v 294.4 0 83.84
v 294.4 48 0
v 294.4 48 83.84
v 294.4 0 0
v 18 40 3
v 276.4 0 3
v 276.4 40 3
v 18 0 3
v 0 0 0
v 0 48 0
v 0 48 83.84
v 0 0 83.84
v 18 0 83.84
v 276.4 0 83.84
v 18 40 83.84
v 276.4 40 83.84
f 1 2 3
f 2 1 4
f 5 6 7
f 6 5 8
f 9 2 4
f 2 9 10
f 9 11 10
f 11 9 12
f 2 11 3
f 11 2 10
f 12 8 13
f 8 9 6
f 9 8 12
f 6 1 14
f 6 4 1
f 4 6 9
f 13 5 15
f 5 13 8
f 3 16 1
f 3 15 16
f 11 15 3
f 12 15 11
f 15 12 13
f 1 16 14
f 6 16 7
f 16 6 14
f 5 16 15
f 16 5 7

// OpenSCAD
// file: ../magnet_well.scad
// magnet_well.scad
// version: 0.2.0
// Shared disc-magnet press-fit recipes and well cutters. Product parts pass a
// named recipe so identical magnet specifications cannot drift by caller.

$fn = 64;
EPS = 0.01;

MAGNET_RECIPE_BORE_DIAMETER = 0;
MAGNET_RECIPE_RIB_TIP_DIAMETER = 1;
MAGNET_RECIPE_RIB_PROTRUSION = 2;
MAGNET_RECIPE_WELL_DEPTH = 3;
MAGNET_RECIPE_CHAMFER = 4;
MAGNET_RECIPE_RIB_COUNT = 5;
MAGNET_RECIPE_RIB_WIDTH = 6;
MAGNET_RECIPE_FIELD_COUNT = 7;

// Canonical product recipe for a 6 x 1.5mm disc magnet. The proven 0.25mm
// radial crush defines the 5.60mm rib-tip diameter from the 6.10mm bore.
// The selected 2.30mm depth remains pending physical confirmation.
function hutchfinity_magnet_recipe_6x1_5() =
    let(
        bore_diameter = 6.10,
        rib_protrusion = 0.25
    ) [
        bore_diameter,
        bore_diameter - 2 * rib_protrusion,
        rib_protrusion,
        2.30,
        0.30,
        8,
        0.80
    ];

function hutchfinity_magnet_recipe_bore_diameter(recipe) =
    recipe[MAGNET_RECIPE_BORE_DIAMETER];
function hutchfinity_magnet_recipe_rib_tip_diameter(recipe) =
    recipe[MAGNET_RECIPE_RIB_TIP_DIAMETER];
function hutchfinity_magnet_recipe_rib_protrusion(recipe) =
    recipe[MAGNET_RECIPE_RIB_PROTRUSION];
function hutchfinity_magnet_recipe_well_depth(recipe) =
    recipe[MAGNET_RECIPE_WELL_DEPTH];
function hutchfinity_magnet_recipe_chamfer(recipe) =
    recipe[MAGNET_RECIPE_CHAMFER];
function hutchfinity_magnet_recipe_rib_count(recipe) =
    recipe[MAGNET_RECIPE_RIB_COUNT];
function hutchfinity_magnet_recipe_rib_width(recipe) =
    recipe[MAGNET_RECIPE_RIB_WIDTH];

function hutchfinity_magnet_recipe_is_valid(recipe) =
    is_list(recipe) &&
    len(recipe) == MAGNET_RECIPE_FIELD_COUNT &&
    hutchfinity_magnet_recipe_bore_diameter(recipe) > 0 &&
    hutchfinity_magnet_recipe_rib_tip_diameter(recipe) > 0 &&
    hutchfinity_magnet_recipe_rib_protrusion(recipe) >= 0 &&
    abs(
        hutchfinity_magnet_recipe_bore_diameter(recipe) -
        hutchfinity_magnet_recipe_rib_tip_diameter(recipe) -
        2 * hutchfinity_magnet_recipe_rib_protrusion(recipe)
    ) <= EPS &&
    hutchfinity_magnet_recipe_well_depth(recipe) > 0 &&
    hutchfinity_magnet_recipe_chamfer(recipe) >= 0 &&
    hutchfinity_magnet_recipe_rib_count(recipe) >= 3 &&
    hutchfinity_magnet_recipe_rib_width(recipe) > 0;

module hutchfinity_magnet_well_cut(
    position,
    recipe = hutchfinity_magnet_recipe_6x1_5(),
    z = 0
) {
    bore_diameter = hutchfinity_magnet_recipe_bore_diameter(recipe);
    rib_tip_diameter = hutchfinity_magnet_recipe_rib_tip_diameter(recipe);
    rib_protrusion = hutchfinity_magnet_recipe_rib_protrusion(recipe);
    well_depth = hutchfinity_magnet_recipe_well_depth(recipe);
    well_chamfer = hutchfinity_magnet_recipe_chamfer(recipe);
    rib_count = hutchfinity_magnet_recipe_rib_count(recipe);
    rib_width = hutchfinity_magnet_recipe_rib_width(recipe);
    bore_r = bore_diameter / 2;
    tip_r = rib_tip_diameter / 2;
    chamfer = min(well_chamfer, well_depth / 2);
    rib_depth = max(EPS, well_depth - chamfer);

    assert(hutchfinity_magnet_recipe_is_valid(recipe),
        "magnet recipe must contain one consistent bore, rib, depth, chamfer, count, and width");

    translate([position[0], position[1], z - EPS])
    union() {
        cylinder(r1=bore_r + chamfer, r2=bore_r, h=chamfer + EPS);

        translate([0, 0, chamfer])
        difference() {
            cylinder(r=bore_r, h=rib_depth + 2 * EPS);

            if (rib_protrusion > EPS) {
                for (i = [0 : rib_count - 1]) {
                    rotate([0, 0, i * (360 / rib_count)])
                    linear_extrude(height=rib_depth + 3 * EPS)
                    polygon([
                        [tip_r, 0],
                        [bore_r, -rib_width / 2],
                        [bore_r, rib_width / 2]
                    ]);
                }
            }
        }
    }
}

module hutchfinity_magnet_well_cuts(
    positions,
    recipe = hutchfinity_magnet_recipe_6x1_5(),
    z = 0
) {
    for (p = positions)
        hutchfinity_magnet_well_cut(p, recipe, z);
}
// file: ../knob.scad
// Hutchfinity optional glue-on knob prototype.
// Version: 0.2.1

$fn = 64;
EPS = 0.01;

BASE_WIDTH = 90.0;
BASE_DEPTH = 34.0;
BASE_THICKNESS = 1.2;
BASE_CORNER_RADIUS = 5.0;

FLARE_WIDTH = 62.0;
FLARE_DEPTH = 28.0;
FLARE_HEIGHT = 3.0;

NECK_WIDTH = 36.0;
NECK_DEPTH = 18.0;
END_BULGE_WIDTH = 56.0;
END_BULGE_DEPTH = 30.0;
GRIP_HEIGHT = 14.0;
GRIP_CORNER_RADIUS = 6.0;

module rounded_box(size, radius) {
    width = size[0];
    depth = size[1];
    height = size[2];
    linear_extrude(height = height)
        offset(r = radius)
            square([max(width - 2 * radius, EPS), max(depth - 2 * radius, EPS)], center = true);
}

module tapered_slug(bottom_size, top_size, height, radius) {
    hull() {
        translate([0, 0, 0])
            rounded_box([bottom_size[0], bottom_size[1], EPS], min(radius, bottom_size[0] / 2 - EPS, bottom_size[1] / 2 - EPS));
        translate([0, 0, height - EPS])
            rounded_box([top_size[0], top_size[1], EPS], min(radius, top_size[0] / 2 - EPS, top_size[1] / 2 - EPS));
    }
}

module hutchfinity_knob(
    base_width = BASE_WIDTH,
    base_depth = BASE_DEPTH,
    base_thickness = BASE_THICKNESS,
    base_corner_radius = BASE_CORNER_RADIUS,
    flare_width = FLARE_WIDTH,
    flare_depth = FLARE_DEPTH,
    flare_height = FLARE_HEIGHT,
    neck_width = NECK_WIDTH,
    neck_depth = NECK_DEPTH,
    end_bulge_width = END_BULGE_WIDTH,
    end_bulge_depth = END_BULGE_DEPTH,
    grip_height = GRIP_HEIGHT,
    grip_corner_radius = GRIP_CORNER_RADIUS
) {
    assert(base_width > end_bulge_width, "base_width must exceed end_bulge_width for a glue flange");
    assert(base_depth > end_bulge_depth, "base_depth must exceed end_bulge_depth for a glue flange");
    assert(end_bulge_width > neck_width, "end_bulge_width should exceed neck_width");
    assert(end_bulge_depth > neck_depth, "end_bulge_depth should exceed neck_depth");

    union() {
        rounded_box([base_width, base_depth, base_thickness], base_corner_radius);

        translate([0, 0, base_thickness - EPS])
            tapered_slug(
                [flare_width, flare_depth],
                [neck_width, neck_depth],
                flare_height + EPS,
                min(grip_corner_radius, flare_depth / 2 - EPS)
            );

        translate([0, 0, base_thickness + flare_height - EPS])
            tapered_slug(
                [neck_width, neck_depth],
                [end_bulge_width, end_bulge_depth],
                grip_height + EPS,
                grip_corner_radius
            );
    }
}

hutchfinity_knob();
// file: ../peg.scad
// peg.scad
// version: 0.5.0
// Prototype laid-down hex peg for vertical Hutchfinity casing stacks.

$fn = 64;
EPS = 0.01;

// Diameter is point-to-point across the hex. The default matches the current
// casing socket default: 8.0mm nominal peg + 0.45mm socket clearance.
PEG_DIAMETER = 8.45;
// Two nominal 10 mm receivers leave 0.4 mm total axial allowance.
PEG_LENGTH = 19.6;
PEG_END_CHAMFER = 2.5;
PEG_CORE_SIDES = 6;
PEG_PRINT_FACE_ROTATION = 30;

function peg_tip_diameter(diameter, chamfer) = max(0.8, diameter - 2 * chamfer);
function peg_flat_to_flat_diameter(diameter, core_sides) =
    diameter * cos(180 / core_sides);

module chamfered_peg_core(diameter, length, chamfer, core_sides) {
    tip_d = peg_tip_diameter(diameter, chamfer);

    union() {
        cylinder(d1=tip_d, d2=diameter, h=chamfer, $fn=core_sides);
        translate([0, 0, chamfer])
            cylinder(d=diameter, h=max(EPS, length - 2 * chamfer), $fn=core_sides);
        translate([0, 0, length - chamfer])
            cylinder(d1=diameter, d2=tip_d, h=chamfer, $fn=core_sides);
    }
}

module hutchfinity_peg(
    diameter=PEG_DIAMETER,
    length=PEG_LENGTH,
    end_chamfer=PEG_END_CHAMFER,
    core_sides=PEG_CORE_SIDES
) {
    chamfer = min(end_chamfer, length / 2 - EPS);

    assert(diameter > 0 && length > 0, "peg diameter and length must be positive");
    assert(end_chamfer >= 0, "peg end chamfer must be non-negative");
    assert(core_sides >= 3, "peg core needs at least three sides");

    chamfered_peg_core(diameter, length, chamfer, core_sides);
}

module hutchfinity_peg_print_layout(
    diameter=PEG_DIAMETER,
    length=PEG_LENGTH,
    end_chamfer=PEG_END_CHAMFER,
    core_sides=PEG_CORE_SIDES,
    print_face_rotation=PEG_PRINT_FACE_ROTATION
) {
    translate([0, 0, peg_flat_to_flat_diameter(diameter, core_sides) / 2])
        rotate([0, 90, 0])
            rotate([0, 0, print_face_rotation])
                hutchfinity_peg(
                    diameter=diameter,
                    length=length,
                    end_chamfer=end_chamfer,
                    core_sides=core_sides
                );
}

hutchfinity_peg_print_layout();
// file: ../hutchfinity.scad
// hutchfinity.scad
// version: 2.1.0
// One file for every sized Hutchfinity part. Open it in OpenSCAD and use the
// Customizer panel, or run ../hutchfinity.py for the app and Orca-ready output.
// Casing, pegs, and pull are derived from the same tub size so they stay matched.
// tub.scad is included, not used, so that -D can override its dimensions too.

include <tub.scad>;
use <casing.scad>;
use <peg.scad>;
use <knob.scad>;

/* [Part] */
part = "tub"; // [tub, grid-insert, casing, peg, pegs, pull]

/* [Tub size] */
cells_x = 12; // [1:1:40]
cells_y = 16; // [1:1:40]
// Tallest bin the tub must hold, in 3.5 mm units.
bin_h = 20; // [5:1:40]
floor_mode = "integral-grid"; // [integral-grid, plain]
pull_guide = true;

/* [Casing] */
side_wall = 18; // [18:1:40]
back_wall = 18; // [18:1:40]
riding_slab = 3.0; // [1.0:0.1:10]
side_clearance = 1.0;
back_clearance = 0.5;
top_clearance = 1.0;
peg_spacing = 190;
casing_fn = 32;

/* [Pegs] */
peg_bore = 8.45;
peg_depth_max = 10;
peg_chamfer = 0.5;
peg_edge_land = 1.2;
peg_end_chamfer = 2.5;

tub_x = tub_outer_x(cells_x);
tub_y = tub_outer_y(cells_y);
tub_z = tub_total_z(bin_h, floor_mode);
slot_x = tub_x + 2 * side_clearance;
slot_y = tub_y + back_clearance;
slot_z = tub_z + top_clearance;
casing_x = slot_x + 2 * side_wall;
casing_y = slot_y + back_wall;
casing_z = slot_z + riding_slab;
// Short casings get shallower sockets and shorter pegs.
peg_depth = min(peg_depth_max, (casing_z - 2) / 2);
peg_length = 2 * peg_depth - 0.4;
effective_peg_end_chamfer = min(peg_end_chamfer, peg_length / 4);
peg_positions = casing_peg_positions(
    casing_x, casing_y, side_wall, back_wall, peg_spacing,
    peg_bore, peg_chamfer, peg_edge_land);

// Printed slab-down, then inverted for installation.
module sized_casing() {
    echo(str("casing: ", casing_x, " x ", casing_y, " x ", casing_z, " mm; ", len(peg_positions), " pegs"));
    hutchfinity_casing(
        slot_width=slot_x, slot_depth=slot_y, slot_height=slot_z,
        side_thickness=side_wall, back_thickness=back_wall, top_thickness=riding_slab,
        peg_spacing=peg_spacing, peg_diameter=peg_bore, peg_clearance=0,
        peg_socket_depth=peg_depth, peg_chamfer=peg_chamfer,
        peg_socket_edge_land=peg_edge_land, peg_end_chamfer=effective_peg_end_chamfer,
        enable_magnet_holes=false, $fn=casing_fn);
}

// A shallow entry/ceiling check with the same current dimensions as the casing.
// It deliberately omits stack sockets and cannot qualify full-depth sliding.
module sized_casing_mouth_gauge(depth=40, back_thickness=8) {
    hutchfinity_casing(
        slot_width=slot_x, slot_depth=depth, slot_height=slot_z,
        side_thickness=side_wall, back_thickness=back_thickness, top_thickness=riding_slab,
        enable_peg_holes=false, enable_magnet_holes=false);
}

module one_peg() {
    hutchfinity_peg_print_layout(
        diameter = peg_bore, length = peg_length,
        end_chamfer = effective_peg_end_chamfer);
}

module sized_pegs() {
    for (i = [0:len(peg_positions) - 1])
        translate([(i % 4) * (peg_length + 6), peg_bore / 2 + floor(i / 4) * 14, 0]) one_peg();
}

// The same pull everywhere, scaled uniformly when the tub is too small for it.
module sized_pull() {
    k = pull_scale_factor(cells_x, bin_h, floor_mode);
    assert(k > 0, "this tub has no wall band for a pull");
    echo(str("pull flange: ", k * PULL_FLANGE_X, " x ", k * PULL_FLANGE_Z, " mm"));
    scale(k) hutchfinity_knob(base_width = PULL_FLANGE_X, base_depth = PULL_FLANGE_Z, end_bulge_depth = 30);
}

// Side-by-side source preview; each production part is exported separately.
module sized_module_preview(show_optional_parts=true) {
    sized_casing();
    if (show_optional_parts) {
        translate([tub_x / 2, casing_y + tub_y / 2 + 20, 0])
            hutchfinity_tub(cells_x, cells_y, bin_h, floor_mode, pull_guide);
        translate([casing_x + 20, 0, 0]) one_peg();
        translate([casing_x + PULL_FLANGE_X / 2 + 20, PULL_FLANGE_Z / 2 + 20, 0]) sized_pull();
    }
}

if (part == "tub") hutchfinity_tub(cells_x, cells_y, bin_h, floor_mode, pull_guide);
else if (part == "grid-insert") hutchfinity_grid_insert(cells_x, cells_y);
else if (part == "casing") sized_casing();
else if (part == "peg") one_peg();
else if (part == "pegs") sized_pegs();
else if (part == "pull") sized_pull();
else assert(false, "unknown part");
assert(bin_h >= 5, "a tub must hold at least a 5h bin");
// main file
// casing_mouth_fit_gauge.scad
// version: 0.2.0
// Current low-filament entry/ceiling gauge. The generator supplies all fit
// dimensions; set cells_x, cells_y, bin_h, and design variables with -D.
// Print slab-down, then invert so the slab is above the tub for the fit test.
// This checks the mouth only; full-depth sliding and stacking remain separate.

use <../hutchfinity.scad>;

GAUGE_SLOT_DEPTH = 40;
GAUGE_BACK_THICKNESS = 8;

sized_casing_mouth_gauge(GAUGE_SLOT_DEPTH, GAUGE_BACK_THICKNESS);
